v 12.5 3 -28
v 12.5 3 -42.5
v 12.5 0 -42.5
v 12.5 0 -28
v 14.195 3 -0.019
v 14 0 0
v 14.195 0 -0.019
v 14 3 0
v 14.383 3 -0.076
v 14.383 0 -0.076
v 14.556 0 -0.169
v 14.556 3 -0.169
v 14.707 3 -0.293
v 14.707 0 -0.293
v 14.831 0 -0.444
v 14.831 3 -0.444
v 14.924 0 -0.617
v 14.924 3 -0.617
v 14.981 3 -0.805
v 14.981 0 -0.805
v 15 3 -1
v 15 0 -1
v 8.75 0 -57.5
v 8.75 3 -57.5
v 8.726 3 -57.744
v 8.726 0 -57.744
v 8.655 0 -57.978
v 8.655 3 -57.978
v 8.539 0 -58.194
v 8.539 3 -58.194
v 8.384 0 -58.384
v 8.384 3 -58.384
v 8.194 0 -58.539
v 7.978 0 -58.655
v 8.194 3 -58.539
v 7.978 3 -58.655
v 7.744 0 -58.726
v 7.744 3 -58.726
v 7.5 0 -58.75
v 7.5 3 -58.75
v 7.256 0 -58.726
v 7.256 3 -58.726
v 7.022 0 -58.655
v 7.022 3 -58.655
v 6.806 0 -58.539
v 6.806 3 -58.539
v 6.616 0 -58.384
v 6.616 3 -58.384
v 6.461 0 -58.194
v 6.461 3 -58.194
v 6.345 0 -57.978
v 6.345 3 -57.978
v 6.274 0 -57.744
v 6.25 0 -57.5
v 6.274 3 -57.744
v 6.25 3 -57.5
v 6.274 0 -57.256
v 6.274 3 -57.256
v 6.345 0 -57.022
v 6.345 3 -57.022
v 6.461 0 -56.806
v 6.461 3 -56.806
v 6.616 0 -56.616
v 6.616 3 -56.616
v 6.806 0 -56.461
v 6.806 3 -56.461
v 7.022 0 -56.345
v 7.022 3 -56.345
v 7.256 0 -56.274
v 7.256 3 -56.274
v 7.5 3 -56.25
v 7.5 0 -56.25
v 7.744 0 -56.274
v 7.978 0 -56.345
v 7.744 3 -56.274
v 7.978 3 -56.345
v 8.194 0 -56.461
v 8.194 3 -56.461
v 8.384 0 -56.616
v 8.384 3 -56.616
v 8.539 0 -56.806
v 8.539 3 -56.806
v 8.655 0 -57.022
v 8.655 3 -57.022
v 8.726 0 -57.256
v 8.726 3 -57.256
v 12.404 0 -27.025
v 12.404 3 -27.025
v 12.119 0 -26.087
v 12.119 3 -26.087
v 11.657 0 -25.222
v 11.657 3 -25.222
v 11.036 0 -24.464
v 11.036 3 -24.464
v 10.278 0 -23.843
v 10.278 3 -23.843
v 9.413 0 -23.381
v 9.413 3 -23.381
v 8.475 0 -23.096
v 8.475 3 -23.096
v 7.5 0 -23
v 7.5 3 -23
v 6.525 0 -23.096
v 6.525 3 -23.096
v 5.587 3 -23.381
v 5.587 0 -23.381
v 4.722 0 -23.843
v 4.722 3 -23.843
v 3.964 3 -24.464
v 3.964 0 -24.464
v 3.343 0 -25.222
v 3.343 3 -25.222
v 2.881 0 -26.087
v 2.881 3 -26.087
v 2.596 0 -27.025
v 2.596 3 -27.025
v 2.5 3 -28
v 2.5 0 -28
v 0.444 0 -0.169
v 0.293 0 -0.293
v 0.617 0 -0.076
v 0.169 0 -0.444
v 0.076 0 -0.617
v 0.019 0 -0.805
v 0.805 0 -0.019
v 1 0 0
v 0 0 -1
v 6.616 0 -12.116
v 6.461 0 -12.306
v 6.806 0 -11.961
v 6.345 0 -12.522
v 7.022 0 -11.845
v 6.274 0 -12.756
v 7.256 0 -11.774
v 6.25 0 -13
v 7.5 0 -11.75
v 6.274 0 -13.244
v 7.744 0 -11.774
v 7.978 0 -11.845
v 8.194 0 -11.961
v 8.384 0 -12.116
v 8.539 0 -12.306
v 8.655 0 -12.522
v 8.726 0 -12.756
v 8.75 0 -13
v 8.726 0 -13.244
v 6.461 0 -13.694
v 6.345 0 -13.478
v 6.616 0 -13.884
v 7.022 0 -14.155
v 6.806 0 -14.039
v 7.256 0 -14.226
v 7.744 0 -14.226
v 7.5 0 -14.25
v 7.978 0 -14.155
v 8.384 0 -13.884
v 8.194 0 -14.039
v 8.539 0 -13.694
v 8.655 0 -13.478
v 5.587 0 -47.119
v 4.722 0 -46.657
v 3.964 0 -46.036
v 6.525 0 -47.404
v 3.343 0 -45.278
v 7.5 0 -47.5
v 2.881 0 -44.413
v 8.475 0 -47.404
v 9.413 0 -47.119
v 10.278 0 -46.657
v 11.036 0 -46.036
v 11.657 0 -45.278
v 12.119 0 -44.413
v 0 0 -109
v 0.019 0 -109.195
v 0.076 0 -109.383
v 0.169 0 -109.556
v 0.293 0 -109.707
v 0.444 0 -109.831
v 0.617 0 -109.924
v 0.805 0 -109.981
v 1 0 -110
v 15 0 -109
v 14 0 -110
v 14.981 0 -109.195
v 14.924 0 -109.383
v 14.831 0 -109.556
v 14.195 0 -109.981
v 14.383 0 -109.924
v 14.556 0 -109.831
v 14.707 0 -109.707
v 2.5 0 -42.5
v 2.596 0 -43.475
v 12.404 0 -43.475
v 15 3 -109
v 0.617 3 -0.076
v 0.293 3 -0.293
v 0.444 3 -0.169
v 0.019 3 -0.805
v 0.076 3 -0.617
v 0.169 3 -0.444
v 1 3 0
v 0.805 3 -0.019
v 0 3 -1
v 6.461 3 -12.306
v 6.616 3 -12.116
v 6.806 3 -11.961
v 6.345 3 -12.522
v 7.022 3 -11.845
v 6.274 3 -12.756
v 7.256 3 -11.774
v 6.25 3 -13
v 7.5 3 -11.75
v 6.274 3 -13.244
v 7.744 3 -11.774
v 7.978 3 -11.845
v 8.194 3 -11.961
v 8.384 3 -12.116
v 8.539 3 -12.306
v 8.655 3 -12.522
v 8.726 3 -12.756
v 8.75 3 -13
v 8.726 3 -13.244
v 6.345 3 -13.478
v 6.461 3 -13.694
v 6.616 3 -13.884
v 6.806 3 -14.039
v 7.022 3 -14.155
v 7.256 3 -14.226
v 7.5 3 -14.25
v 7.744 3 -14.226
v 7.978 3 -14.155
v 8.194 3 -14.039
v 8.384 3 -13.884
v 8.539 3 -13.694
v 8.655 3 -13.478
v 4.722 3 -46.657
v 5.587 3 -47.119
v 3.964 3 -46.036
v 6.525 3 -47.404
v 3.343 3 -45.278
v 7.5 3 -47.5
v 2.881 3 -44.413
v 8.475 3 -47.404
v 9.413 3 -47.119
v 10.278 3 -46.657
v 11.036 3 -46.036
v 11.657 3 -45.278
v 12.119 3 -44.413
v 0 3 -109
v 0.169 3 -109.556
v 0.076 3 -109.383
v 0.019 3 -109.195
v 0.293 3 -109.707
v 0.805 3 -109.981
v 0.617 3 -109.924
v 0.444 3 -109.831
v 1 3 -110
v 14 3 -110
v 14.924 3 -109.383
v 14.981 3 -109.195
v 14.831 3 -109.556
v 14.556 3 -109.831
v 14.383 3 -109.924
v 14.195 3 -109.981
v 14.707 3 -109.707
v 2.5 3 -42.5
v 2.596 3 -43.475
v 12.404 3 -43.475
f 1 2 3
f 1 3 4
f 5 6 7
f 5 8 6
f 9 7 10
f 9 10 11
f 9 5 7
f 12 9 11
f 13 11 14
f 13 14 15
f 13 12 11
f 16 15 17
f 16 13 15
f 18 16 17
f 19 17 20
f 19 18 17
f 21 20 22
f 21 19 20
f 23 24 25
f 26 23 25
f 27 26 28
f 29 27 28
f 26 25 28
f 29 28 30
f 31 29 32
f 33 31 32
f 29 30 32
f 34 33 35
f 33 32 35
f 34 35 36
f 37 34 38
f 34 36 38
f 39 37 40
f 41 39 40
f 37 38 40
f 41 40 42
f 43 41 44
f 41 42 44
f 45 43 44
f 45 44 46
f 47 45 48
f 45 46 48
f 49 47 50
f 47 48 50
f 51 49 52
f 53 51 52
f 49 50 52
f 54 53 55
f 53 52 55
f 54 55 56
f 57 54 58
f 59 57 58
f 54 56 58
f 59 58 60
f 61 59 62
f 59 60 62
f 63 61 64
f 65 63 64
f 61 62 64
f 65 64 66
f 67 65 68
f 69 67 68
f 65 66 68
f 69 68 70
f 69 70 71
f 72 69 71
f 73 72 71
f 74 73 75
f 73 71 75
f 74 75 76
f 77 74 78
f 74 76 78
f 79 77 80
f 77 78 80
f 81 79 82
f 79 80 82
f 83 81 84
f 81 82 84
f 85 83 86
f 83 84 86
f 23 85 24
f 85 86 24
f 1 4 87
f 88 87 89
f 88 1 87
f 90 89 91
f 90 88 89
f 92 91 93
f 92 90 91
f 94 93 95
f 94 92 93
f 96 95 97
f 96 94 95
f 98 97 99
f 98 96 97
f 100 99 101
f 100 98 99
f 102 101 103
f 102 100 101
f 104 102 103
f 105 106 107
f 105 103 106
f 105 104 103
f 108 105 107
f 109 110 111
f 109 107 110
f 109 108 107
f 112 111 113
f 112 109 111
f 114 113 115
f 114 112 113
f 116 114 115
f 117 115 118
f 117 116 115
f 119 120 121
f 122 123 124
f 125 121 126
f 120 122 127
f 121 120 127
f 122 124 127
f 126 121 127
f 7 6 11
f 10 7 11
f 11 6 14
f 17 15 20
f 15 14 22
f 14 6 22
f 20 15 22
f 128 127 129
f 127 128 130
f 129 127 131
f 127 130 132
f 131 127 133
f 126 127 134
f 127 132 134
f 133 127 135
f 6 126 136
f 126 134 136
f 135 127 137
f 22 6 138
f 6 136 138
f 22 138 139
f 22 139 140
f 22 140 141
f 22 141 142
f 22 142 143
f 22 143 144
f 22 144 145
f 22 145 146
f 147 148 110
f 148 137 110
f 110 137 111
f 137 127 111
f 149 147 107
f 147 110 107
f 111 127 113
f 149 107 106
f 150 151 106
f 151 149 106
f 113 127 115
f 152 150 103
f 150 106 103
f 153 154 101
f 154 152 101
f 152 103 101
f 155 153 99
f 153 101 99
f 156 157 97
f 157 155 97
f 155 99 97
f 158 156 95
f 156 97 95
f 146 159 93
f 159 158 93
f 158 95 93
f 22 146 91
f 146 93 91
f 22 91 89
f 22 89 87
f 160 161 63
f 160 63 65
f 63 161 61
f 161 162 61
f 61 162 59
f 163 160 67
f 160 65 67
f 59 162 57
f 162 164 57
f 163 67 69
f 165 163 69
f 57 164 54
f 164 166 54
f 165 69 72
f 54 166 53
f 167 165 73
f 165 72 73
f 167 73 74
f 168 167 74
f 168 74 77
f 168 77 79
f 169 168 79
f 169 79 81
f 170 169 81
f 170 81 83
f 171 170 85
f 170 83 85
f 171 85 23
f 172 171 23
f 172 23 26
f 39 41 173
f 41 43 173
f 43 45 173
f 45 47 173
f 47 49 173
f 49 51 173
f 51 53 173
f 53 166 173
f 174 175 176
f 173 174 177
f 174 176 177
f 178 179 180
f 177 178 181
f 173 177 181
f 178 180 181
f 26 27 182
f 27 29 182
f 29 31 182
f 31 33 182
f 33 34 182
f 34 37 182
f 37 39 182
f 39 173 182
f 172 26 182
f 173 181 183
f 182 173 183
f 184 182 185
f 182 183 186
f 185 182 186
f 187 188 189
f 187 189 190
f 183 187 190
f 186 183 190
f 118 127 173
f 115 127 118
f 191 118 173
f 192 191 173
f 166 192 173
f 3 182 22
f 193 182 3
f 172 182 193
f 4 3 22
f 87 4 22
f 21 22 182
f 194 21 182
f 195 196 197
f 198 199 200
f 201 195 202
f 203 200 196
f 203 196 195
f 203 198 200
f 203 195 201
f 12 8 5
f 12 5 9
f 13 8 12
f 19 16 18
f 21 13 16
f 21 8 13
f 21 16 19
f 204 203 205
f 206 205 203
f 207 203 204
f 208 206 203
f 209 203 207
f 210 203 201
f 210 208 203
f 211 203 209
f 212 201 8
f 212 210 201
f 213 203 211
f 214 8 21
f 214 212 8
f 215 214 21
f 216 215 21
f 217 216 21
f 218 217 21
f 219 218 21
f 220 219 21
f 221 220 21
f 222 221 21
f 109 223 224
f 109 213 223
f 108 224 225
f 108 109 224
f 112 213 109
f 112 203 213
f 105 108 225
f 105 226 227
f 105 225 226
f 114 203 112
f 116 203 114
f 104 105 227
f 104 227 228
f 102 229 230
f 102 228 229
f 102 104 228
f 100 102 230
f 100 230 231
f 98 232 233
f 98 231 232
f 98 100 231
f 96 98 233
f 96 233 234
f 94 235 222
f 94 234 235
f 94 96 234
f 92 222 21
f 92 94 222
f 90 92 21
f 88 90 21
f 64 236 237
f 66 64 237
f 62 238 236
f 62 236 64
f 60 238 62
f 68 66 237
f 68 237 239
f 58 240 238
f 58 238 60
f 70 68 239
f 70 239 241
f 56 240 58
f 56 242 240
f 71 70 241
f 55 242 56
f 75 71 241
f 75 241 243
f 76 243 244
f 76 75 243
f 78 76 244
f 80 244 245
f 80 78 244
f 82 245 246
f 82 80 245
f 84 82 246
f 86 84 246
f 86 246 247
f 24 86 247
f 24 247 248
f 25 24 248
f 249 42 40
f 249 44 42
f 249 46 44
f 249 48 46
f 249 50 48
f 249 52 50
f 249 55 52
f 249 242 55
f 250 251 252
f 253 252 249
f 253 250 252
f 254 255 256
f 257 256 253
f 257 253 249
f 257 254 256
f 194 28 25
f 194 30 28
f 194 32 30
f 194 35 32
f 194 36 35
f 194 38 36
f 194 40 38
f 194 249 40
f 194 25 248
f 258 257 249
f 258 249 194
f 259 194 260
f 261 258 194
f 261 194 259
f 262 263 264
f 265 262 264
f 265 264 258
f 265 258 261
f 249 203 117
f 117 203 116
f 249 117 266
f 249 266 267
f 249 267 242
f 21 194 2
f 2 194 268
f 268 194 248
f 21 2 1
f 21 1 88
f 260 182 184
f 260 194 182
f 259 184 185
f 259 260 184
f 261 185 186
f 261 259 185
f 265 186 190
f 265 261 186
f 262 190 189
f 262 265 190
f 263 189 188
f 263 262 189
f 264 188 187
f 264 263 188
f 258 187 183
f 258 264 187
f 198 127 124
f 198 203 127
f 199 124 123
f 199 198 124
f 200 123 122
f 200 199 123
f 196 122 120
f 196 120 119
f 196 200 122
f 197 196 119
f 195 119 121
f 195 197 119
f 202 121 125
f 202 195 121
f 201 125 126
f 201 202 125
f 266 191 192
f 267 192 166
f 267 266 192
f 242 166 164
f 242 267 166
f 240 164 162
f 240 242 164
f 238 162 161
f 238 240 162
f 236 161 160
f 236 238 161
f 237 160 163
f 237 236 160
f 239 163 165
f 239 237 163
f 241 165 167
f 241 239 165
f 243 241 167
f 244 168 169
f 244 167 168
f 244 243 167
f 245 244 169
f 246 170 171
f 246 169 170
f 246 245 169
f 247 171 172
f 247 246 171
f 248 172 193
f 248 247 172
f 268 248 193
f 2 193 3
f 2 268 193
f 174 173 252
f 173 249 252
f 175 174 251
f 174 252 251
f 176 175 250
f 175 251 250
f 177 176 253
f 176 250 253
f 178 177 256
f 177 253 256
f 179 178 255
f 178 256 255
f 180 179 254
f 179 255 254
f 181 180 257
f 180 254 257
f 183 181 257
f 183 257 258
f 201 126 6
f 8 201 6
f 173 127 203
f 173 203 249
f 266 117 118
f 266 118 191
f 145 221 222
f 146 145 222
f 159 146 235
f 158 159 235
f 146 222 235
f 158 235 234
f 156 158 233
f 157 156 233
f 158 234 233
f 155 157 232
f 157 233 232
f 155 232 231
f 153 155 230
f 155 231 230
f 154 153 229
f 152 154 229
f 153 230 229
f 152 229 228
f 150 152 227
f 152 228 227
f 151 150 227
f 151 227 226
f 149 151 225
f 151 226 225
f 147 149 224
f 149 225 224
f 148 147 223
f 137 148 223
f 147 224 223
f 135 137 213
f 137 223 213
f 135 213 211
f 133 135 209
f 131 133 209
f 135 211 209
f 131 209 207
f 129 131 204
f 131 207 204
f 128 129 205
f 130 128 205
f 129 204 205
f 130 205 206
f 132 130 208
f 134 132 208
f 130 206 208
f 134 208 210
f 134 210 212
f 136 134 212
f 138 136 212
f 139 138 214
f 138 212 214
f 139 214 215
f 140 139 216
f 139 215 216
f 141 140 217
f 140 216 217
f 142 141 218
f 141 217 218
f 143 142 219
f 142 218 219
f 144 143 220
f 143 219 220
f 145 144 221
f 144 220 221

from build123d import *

# Parameters (mm, degrees)
SKETCH_1_W          = 15
SKETCH_1_H          = 110
EXTRUDE_1_DEPTH     = 3
FILLET_1_R          = 1
SKETCH_2_R          = 1.25
CUT_EXTRUDE_1_DEPTH = 3
CUT_EXTRUDE_2_DEPTH = 10


with BuildPart() as part:
    # 草图1 → 凸台-拉伸1 (new body)
    with BuildSketch(Plane(origin=(0, 0, 0), x_dir=(1, 0, 0), z_dir=(0, 1, 0))):
        with Locations((7.5, 55)):
            Rectangle(SKETCH_1_W, SKETCH_1_H)
    extrude(amount=EXTRUDE_1_DEPTH)

    # 圆角1
    fillet_1_edges = [part.edges().sort_by_distance(p)[0] for p in [
        (0, 1.5, -110),
        (15, 1.5, -110),
        (15, 1.5, 0),
        (0, 1.5, 0),
    ]]
    fillet(fillet_1_edges, radius=FILLET_1_R)

    # 草图2 → 切除-拉伸1 (cut)
    with BuildSketch(Plane(origin=(0, 3, 0), x_dir=(1, 0, 0), z_dir=(0, 1, 0))):
        with Locations((7.5, 13)):
            Circle(SKETCH_2_R)
        with Locations((7.5, 57.5)):
            Circle(SKETCH_2_R)
    extrude(amount=-CUT_EXTRUDE_1_DEPTH, mode=Mode.SUBTRACT)

    # 草图3 → 切除-拉伸2 (cut)
    with BuildSketch(Plane(origin=(0, 3, 0), x_dir=(1, 0, 0), z_dir=(0, 1, 0))):
        with BuildLine():
            Line((12.5, 42.5), (12.5, 28))
            ThreePointArc((12.5, 28), (7.5, 23), (2.5, 28))
            Line((2.5, 28), (2.5, 42.5))
            ThreePointArc((2.5, 42.5), (7.5, 47.5), (12.5, 42.5))
        make_face()
    extrude(amount=-CUT_EXTRUDE_2_DEPTH, mode=Mode.SUBTRACT)


solid = part.part
